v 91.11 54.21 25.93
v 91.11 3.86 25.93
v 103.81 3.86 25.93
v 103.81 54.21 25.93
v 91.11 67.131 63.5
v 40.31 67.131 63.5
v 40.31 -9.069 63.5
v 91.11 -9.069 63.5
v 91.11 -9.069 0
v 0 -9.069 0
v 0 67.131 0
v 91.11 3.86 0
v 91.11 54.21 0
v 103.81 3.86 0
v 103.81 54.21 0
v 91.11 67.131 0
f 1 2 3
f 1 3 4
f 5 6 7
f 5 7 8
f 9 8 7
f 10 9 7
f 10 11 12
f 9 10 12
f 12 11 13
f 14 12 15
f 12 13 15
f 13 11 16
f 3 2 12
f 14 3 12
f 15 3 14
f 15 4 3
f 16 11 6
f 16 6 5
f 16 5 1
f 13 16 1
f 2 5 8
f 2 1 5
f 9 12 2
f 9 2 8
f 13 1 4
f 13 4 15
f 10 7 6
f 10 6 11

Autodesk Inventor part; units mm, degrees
ref_plane "YZ Plane" through (0, 0, 0) normal (1, 0, 0) x (0, 1, 0)
ref_plane "XZ Plane" through (0, 0, 0) normal (0, 1, 0) x (-1, 0, 0)
ref_plane "XY Plane" through (0, 0, 0) normal (0, 0, 1) x (1, 0, 0)
sketch "Sketch1" plane through (0, 0, 0) normal (0, 0, 1) x (1, 0, 0)
  line L0 (40.3102, 67.1309) -> (91.1102, 67.1309)
  line L1 (91.1102, 67.1309) -> (91.1102, -9.0691)
  line L2 (91.1102, -9.0691) -> (40.3102, -9.0691)
  line L3 (40.3102, -9.0691) -> (40.3102, 67.1309)
  point P0 (0, 0)
  dimension "d0" = 50.8
  dimension "d1" = 76.2
extrude "Extrusion1" add sketch "Sketch1" along normal blind 63.5
sketch "Sketch2" plane through (40.3102, -9.0691, 0) normal (0, -1, 0) x (1, 0, 0)
  line L0 (0, 0) -> (0, 63.5) projected
  line L1 (50.8, 63.5) -> (0, 63.5) projected
  line L2 (0, 0) -> (50.8, 0) projected
  line L3 (0, 0) -> (-40.3102, 0)
  line L4 (0, 63.5) -> (-40.3102, 0)
extrude "Extrusion2" add sketch "Sketch2" against normal blind 76.2
sketch "Sketch6" plane through (91.1102, -9.0691, 0) normal (1, 0, 0) x (0, 0, -1)
  line L0 (-63.5, 0) -> (-63.5, 76.2) projected
  line L1 (0, 76.2) -> (0, 0) projected
  line L2 (-25.9302, 38.1) -> (-25.9302, 63.2786)
  line L3 (-25.9302, 63.2786) -> (0, 63.2786)
  line L4 (-25.9302, 38.1) -> (-25.9302, 12.9286)
  line L5 (-25.9302, 38.1) -> (-0.7588, 38.1) construction
  line L6 (-25.9302, 12.9286) -> (0, 12.9286)
  point P0 (0, 9.0691)
  dimension "d11" = 25.1714
  dimension "d12" = 90
  dimension "d13" = 50.35
  dimension "d14" = 25.9302
extrude "Extrusion3" add sketch "Sketch6" along normal blind 12.7
properties part number "mcdave_summo_robot"
